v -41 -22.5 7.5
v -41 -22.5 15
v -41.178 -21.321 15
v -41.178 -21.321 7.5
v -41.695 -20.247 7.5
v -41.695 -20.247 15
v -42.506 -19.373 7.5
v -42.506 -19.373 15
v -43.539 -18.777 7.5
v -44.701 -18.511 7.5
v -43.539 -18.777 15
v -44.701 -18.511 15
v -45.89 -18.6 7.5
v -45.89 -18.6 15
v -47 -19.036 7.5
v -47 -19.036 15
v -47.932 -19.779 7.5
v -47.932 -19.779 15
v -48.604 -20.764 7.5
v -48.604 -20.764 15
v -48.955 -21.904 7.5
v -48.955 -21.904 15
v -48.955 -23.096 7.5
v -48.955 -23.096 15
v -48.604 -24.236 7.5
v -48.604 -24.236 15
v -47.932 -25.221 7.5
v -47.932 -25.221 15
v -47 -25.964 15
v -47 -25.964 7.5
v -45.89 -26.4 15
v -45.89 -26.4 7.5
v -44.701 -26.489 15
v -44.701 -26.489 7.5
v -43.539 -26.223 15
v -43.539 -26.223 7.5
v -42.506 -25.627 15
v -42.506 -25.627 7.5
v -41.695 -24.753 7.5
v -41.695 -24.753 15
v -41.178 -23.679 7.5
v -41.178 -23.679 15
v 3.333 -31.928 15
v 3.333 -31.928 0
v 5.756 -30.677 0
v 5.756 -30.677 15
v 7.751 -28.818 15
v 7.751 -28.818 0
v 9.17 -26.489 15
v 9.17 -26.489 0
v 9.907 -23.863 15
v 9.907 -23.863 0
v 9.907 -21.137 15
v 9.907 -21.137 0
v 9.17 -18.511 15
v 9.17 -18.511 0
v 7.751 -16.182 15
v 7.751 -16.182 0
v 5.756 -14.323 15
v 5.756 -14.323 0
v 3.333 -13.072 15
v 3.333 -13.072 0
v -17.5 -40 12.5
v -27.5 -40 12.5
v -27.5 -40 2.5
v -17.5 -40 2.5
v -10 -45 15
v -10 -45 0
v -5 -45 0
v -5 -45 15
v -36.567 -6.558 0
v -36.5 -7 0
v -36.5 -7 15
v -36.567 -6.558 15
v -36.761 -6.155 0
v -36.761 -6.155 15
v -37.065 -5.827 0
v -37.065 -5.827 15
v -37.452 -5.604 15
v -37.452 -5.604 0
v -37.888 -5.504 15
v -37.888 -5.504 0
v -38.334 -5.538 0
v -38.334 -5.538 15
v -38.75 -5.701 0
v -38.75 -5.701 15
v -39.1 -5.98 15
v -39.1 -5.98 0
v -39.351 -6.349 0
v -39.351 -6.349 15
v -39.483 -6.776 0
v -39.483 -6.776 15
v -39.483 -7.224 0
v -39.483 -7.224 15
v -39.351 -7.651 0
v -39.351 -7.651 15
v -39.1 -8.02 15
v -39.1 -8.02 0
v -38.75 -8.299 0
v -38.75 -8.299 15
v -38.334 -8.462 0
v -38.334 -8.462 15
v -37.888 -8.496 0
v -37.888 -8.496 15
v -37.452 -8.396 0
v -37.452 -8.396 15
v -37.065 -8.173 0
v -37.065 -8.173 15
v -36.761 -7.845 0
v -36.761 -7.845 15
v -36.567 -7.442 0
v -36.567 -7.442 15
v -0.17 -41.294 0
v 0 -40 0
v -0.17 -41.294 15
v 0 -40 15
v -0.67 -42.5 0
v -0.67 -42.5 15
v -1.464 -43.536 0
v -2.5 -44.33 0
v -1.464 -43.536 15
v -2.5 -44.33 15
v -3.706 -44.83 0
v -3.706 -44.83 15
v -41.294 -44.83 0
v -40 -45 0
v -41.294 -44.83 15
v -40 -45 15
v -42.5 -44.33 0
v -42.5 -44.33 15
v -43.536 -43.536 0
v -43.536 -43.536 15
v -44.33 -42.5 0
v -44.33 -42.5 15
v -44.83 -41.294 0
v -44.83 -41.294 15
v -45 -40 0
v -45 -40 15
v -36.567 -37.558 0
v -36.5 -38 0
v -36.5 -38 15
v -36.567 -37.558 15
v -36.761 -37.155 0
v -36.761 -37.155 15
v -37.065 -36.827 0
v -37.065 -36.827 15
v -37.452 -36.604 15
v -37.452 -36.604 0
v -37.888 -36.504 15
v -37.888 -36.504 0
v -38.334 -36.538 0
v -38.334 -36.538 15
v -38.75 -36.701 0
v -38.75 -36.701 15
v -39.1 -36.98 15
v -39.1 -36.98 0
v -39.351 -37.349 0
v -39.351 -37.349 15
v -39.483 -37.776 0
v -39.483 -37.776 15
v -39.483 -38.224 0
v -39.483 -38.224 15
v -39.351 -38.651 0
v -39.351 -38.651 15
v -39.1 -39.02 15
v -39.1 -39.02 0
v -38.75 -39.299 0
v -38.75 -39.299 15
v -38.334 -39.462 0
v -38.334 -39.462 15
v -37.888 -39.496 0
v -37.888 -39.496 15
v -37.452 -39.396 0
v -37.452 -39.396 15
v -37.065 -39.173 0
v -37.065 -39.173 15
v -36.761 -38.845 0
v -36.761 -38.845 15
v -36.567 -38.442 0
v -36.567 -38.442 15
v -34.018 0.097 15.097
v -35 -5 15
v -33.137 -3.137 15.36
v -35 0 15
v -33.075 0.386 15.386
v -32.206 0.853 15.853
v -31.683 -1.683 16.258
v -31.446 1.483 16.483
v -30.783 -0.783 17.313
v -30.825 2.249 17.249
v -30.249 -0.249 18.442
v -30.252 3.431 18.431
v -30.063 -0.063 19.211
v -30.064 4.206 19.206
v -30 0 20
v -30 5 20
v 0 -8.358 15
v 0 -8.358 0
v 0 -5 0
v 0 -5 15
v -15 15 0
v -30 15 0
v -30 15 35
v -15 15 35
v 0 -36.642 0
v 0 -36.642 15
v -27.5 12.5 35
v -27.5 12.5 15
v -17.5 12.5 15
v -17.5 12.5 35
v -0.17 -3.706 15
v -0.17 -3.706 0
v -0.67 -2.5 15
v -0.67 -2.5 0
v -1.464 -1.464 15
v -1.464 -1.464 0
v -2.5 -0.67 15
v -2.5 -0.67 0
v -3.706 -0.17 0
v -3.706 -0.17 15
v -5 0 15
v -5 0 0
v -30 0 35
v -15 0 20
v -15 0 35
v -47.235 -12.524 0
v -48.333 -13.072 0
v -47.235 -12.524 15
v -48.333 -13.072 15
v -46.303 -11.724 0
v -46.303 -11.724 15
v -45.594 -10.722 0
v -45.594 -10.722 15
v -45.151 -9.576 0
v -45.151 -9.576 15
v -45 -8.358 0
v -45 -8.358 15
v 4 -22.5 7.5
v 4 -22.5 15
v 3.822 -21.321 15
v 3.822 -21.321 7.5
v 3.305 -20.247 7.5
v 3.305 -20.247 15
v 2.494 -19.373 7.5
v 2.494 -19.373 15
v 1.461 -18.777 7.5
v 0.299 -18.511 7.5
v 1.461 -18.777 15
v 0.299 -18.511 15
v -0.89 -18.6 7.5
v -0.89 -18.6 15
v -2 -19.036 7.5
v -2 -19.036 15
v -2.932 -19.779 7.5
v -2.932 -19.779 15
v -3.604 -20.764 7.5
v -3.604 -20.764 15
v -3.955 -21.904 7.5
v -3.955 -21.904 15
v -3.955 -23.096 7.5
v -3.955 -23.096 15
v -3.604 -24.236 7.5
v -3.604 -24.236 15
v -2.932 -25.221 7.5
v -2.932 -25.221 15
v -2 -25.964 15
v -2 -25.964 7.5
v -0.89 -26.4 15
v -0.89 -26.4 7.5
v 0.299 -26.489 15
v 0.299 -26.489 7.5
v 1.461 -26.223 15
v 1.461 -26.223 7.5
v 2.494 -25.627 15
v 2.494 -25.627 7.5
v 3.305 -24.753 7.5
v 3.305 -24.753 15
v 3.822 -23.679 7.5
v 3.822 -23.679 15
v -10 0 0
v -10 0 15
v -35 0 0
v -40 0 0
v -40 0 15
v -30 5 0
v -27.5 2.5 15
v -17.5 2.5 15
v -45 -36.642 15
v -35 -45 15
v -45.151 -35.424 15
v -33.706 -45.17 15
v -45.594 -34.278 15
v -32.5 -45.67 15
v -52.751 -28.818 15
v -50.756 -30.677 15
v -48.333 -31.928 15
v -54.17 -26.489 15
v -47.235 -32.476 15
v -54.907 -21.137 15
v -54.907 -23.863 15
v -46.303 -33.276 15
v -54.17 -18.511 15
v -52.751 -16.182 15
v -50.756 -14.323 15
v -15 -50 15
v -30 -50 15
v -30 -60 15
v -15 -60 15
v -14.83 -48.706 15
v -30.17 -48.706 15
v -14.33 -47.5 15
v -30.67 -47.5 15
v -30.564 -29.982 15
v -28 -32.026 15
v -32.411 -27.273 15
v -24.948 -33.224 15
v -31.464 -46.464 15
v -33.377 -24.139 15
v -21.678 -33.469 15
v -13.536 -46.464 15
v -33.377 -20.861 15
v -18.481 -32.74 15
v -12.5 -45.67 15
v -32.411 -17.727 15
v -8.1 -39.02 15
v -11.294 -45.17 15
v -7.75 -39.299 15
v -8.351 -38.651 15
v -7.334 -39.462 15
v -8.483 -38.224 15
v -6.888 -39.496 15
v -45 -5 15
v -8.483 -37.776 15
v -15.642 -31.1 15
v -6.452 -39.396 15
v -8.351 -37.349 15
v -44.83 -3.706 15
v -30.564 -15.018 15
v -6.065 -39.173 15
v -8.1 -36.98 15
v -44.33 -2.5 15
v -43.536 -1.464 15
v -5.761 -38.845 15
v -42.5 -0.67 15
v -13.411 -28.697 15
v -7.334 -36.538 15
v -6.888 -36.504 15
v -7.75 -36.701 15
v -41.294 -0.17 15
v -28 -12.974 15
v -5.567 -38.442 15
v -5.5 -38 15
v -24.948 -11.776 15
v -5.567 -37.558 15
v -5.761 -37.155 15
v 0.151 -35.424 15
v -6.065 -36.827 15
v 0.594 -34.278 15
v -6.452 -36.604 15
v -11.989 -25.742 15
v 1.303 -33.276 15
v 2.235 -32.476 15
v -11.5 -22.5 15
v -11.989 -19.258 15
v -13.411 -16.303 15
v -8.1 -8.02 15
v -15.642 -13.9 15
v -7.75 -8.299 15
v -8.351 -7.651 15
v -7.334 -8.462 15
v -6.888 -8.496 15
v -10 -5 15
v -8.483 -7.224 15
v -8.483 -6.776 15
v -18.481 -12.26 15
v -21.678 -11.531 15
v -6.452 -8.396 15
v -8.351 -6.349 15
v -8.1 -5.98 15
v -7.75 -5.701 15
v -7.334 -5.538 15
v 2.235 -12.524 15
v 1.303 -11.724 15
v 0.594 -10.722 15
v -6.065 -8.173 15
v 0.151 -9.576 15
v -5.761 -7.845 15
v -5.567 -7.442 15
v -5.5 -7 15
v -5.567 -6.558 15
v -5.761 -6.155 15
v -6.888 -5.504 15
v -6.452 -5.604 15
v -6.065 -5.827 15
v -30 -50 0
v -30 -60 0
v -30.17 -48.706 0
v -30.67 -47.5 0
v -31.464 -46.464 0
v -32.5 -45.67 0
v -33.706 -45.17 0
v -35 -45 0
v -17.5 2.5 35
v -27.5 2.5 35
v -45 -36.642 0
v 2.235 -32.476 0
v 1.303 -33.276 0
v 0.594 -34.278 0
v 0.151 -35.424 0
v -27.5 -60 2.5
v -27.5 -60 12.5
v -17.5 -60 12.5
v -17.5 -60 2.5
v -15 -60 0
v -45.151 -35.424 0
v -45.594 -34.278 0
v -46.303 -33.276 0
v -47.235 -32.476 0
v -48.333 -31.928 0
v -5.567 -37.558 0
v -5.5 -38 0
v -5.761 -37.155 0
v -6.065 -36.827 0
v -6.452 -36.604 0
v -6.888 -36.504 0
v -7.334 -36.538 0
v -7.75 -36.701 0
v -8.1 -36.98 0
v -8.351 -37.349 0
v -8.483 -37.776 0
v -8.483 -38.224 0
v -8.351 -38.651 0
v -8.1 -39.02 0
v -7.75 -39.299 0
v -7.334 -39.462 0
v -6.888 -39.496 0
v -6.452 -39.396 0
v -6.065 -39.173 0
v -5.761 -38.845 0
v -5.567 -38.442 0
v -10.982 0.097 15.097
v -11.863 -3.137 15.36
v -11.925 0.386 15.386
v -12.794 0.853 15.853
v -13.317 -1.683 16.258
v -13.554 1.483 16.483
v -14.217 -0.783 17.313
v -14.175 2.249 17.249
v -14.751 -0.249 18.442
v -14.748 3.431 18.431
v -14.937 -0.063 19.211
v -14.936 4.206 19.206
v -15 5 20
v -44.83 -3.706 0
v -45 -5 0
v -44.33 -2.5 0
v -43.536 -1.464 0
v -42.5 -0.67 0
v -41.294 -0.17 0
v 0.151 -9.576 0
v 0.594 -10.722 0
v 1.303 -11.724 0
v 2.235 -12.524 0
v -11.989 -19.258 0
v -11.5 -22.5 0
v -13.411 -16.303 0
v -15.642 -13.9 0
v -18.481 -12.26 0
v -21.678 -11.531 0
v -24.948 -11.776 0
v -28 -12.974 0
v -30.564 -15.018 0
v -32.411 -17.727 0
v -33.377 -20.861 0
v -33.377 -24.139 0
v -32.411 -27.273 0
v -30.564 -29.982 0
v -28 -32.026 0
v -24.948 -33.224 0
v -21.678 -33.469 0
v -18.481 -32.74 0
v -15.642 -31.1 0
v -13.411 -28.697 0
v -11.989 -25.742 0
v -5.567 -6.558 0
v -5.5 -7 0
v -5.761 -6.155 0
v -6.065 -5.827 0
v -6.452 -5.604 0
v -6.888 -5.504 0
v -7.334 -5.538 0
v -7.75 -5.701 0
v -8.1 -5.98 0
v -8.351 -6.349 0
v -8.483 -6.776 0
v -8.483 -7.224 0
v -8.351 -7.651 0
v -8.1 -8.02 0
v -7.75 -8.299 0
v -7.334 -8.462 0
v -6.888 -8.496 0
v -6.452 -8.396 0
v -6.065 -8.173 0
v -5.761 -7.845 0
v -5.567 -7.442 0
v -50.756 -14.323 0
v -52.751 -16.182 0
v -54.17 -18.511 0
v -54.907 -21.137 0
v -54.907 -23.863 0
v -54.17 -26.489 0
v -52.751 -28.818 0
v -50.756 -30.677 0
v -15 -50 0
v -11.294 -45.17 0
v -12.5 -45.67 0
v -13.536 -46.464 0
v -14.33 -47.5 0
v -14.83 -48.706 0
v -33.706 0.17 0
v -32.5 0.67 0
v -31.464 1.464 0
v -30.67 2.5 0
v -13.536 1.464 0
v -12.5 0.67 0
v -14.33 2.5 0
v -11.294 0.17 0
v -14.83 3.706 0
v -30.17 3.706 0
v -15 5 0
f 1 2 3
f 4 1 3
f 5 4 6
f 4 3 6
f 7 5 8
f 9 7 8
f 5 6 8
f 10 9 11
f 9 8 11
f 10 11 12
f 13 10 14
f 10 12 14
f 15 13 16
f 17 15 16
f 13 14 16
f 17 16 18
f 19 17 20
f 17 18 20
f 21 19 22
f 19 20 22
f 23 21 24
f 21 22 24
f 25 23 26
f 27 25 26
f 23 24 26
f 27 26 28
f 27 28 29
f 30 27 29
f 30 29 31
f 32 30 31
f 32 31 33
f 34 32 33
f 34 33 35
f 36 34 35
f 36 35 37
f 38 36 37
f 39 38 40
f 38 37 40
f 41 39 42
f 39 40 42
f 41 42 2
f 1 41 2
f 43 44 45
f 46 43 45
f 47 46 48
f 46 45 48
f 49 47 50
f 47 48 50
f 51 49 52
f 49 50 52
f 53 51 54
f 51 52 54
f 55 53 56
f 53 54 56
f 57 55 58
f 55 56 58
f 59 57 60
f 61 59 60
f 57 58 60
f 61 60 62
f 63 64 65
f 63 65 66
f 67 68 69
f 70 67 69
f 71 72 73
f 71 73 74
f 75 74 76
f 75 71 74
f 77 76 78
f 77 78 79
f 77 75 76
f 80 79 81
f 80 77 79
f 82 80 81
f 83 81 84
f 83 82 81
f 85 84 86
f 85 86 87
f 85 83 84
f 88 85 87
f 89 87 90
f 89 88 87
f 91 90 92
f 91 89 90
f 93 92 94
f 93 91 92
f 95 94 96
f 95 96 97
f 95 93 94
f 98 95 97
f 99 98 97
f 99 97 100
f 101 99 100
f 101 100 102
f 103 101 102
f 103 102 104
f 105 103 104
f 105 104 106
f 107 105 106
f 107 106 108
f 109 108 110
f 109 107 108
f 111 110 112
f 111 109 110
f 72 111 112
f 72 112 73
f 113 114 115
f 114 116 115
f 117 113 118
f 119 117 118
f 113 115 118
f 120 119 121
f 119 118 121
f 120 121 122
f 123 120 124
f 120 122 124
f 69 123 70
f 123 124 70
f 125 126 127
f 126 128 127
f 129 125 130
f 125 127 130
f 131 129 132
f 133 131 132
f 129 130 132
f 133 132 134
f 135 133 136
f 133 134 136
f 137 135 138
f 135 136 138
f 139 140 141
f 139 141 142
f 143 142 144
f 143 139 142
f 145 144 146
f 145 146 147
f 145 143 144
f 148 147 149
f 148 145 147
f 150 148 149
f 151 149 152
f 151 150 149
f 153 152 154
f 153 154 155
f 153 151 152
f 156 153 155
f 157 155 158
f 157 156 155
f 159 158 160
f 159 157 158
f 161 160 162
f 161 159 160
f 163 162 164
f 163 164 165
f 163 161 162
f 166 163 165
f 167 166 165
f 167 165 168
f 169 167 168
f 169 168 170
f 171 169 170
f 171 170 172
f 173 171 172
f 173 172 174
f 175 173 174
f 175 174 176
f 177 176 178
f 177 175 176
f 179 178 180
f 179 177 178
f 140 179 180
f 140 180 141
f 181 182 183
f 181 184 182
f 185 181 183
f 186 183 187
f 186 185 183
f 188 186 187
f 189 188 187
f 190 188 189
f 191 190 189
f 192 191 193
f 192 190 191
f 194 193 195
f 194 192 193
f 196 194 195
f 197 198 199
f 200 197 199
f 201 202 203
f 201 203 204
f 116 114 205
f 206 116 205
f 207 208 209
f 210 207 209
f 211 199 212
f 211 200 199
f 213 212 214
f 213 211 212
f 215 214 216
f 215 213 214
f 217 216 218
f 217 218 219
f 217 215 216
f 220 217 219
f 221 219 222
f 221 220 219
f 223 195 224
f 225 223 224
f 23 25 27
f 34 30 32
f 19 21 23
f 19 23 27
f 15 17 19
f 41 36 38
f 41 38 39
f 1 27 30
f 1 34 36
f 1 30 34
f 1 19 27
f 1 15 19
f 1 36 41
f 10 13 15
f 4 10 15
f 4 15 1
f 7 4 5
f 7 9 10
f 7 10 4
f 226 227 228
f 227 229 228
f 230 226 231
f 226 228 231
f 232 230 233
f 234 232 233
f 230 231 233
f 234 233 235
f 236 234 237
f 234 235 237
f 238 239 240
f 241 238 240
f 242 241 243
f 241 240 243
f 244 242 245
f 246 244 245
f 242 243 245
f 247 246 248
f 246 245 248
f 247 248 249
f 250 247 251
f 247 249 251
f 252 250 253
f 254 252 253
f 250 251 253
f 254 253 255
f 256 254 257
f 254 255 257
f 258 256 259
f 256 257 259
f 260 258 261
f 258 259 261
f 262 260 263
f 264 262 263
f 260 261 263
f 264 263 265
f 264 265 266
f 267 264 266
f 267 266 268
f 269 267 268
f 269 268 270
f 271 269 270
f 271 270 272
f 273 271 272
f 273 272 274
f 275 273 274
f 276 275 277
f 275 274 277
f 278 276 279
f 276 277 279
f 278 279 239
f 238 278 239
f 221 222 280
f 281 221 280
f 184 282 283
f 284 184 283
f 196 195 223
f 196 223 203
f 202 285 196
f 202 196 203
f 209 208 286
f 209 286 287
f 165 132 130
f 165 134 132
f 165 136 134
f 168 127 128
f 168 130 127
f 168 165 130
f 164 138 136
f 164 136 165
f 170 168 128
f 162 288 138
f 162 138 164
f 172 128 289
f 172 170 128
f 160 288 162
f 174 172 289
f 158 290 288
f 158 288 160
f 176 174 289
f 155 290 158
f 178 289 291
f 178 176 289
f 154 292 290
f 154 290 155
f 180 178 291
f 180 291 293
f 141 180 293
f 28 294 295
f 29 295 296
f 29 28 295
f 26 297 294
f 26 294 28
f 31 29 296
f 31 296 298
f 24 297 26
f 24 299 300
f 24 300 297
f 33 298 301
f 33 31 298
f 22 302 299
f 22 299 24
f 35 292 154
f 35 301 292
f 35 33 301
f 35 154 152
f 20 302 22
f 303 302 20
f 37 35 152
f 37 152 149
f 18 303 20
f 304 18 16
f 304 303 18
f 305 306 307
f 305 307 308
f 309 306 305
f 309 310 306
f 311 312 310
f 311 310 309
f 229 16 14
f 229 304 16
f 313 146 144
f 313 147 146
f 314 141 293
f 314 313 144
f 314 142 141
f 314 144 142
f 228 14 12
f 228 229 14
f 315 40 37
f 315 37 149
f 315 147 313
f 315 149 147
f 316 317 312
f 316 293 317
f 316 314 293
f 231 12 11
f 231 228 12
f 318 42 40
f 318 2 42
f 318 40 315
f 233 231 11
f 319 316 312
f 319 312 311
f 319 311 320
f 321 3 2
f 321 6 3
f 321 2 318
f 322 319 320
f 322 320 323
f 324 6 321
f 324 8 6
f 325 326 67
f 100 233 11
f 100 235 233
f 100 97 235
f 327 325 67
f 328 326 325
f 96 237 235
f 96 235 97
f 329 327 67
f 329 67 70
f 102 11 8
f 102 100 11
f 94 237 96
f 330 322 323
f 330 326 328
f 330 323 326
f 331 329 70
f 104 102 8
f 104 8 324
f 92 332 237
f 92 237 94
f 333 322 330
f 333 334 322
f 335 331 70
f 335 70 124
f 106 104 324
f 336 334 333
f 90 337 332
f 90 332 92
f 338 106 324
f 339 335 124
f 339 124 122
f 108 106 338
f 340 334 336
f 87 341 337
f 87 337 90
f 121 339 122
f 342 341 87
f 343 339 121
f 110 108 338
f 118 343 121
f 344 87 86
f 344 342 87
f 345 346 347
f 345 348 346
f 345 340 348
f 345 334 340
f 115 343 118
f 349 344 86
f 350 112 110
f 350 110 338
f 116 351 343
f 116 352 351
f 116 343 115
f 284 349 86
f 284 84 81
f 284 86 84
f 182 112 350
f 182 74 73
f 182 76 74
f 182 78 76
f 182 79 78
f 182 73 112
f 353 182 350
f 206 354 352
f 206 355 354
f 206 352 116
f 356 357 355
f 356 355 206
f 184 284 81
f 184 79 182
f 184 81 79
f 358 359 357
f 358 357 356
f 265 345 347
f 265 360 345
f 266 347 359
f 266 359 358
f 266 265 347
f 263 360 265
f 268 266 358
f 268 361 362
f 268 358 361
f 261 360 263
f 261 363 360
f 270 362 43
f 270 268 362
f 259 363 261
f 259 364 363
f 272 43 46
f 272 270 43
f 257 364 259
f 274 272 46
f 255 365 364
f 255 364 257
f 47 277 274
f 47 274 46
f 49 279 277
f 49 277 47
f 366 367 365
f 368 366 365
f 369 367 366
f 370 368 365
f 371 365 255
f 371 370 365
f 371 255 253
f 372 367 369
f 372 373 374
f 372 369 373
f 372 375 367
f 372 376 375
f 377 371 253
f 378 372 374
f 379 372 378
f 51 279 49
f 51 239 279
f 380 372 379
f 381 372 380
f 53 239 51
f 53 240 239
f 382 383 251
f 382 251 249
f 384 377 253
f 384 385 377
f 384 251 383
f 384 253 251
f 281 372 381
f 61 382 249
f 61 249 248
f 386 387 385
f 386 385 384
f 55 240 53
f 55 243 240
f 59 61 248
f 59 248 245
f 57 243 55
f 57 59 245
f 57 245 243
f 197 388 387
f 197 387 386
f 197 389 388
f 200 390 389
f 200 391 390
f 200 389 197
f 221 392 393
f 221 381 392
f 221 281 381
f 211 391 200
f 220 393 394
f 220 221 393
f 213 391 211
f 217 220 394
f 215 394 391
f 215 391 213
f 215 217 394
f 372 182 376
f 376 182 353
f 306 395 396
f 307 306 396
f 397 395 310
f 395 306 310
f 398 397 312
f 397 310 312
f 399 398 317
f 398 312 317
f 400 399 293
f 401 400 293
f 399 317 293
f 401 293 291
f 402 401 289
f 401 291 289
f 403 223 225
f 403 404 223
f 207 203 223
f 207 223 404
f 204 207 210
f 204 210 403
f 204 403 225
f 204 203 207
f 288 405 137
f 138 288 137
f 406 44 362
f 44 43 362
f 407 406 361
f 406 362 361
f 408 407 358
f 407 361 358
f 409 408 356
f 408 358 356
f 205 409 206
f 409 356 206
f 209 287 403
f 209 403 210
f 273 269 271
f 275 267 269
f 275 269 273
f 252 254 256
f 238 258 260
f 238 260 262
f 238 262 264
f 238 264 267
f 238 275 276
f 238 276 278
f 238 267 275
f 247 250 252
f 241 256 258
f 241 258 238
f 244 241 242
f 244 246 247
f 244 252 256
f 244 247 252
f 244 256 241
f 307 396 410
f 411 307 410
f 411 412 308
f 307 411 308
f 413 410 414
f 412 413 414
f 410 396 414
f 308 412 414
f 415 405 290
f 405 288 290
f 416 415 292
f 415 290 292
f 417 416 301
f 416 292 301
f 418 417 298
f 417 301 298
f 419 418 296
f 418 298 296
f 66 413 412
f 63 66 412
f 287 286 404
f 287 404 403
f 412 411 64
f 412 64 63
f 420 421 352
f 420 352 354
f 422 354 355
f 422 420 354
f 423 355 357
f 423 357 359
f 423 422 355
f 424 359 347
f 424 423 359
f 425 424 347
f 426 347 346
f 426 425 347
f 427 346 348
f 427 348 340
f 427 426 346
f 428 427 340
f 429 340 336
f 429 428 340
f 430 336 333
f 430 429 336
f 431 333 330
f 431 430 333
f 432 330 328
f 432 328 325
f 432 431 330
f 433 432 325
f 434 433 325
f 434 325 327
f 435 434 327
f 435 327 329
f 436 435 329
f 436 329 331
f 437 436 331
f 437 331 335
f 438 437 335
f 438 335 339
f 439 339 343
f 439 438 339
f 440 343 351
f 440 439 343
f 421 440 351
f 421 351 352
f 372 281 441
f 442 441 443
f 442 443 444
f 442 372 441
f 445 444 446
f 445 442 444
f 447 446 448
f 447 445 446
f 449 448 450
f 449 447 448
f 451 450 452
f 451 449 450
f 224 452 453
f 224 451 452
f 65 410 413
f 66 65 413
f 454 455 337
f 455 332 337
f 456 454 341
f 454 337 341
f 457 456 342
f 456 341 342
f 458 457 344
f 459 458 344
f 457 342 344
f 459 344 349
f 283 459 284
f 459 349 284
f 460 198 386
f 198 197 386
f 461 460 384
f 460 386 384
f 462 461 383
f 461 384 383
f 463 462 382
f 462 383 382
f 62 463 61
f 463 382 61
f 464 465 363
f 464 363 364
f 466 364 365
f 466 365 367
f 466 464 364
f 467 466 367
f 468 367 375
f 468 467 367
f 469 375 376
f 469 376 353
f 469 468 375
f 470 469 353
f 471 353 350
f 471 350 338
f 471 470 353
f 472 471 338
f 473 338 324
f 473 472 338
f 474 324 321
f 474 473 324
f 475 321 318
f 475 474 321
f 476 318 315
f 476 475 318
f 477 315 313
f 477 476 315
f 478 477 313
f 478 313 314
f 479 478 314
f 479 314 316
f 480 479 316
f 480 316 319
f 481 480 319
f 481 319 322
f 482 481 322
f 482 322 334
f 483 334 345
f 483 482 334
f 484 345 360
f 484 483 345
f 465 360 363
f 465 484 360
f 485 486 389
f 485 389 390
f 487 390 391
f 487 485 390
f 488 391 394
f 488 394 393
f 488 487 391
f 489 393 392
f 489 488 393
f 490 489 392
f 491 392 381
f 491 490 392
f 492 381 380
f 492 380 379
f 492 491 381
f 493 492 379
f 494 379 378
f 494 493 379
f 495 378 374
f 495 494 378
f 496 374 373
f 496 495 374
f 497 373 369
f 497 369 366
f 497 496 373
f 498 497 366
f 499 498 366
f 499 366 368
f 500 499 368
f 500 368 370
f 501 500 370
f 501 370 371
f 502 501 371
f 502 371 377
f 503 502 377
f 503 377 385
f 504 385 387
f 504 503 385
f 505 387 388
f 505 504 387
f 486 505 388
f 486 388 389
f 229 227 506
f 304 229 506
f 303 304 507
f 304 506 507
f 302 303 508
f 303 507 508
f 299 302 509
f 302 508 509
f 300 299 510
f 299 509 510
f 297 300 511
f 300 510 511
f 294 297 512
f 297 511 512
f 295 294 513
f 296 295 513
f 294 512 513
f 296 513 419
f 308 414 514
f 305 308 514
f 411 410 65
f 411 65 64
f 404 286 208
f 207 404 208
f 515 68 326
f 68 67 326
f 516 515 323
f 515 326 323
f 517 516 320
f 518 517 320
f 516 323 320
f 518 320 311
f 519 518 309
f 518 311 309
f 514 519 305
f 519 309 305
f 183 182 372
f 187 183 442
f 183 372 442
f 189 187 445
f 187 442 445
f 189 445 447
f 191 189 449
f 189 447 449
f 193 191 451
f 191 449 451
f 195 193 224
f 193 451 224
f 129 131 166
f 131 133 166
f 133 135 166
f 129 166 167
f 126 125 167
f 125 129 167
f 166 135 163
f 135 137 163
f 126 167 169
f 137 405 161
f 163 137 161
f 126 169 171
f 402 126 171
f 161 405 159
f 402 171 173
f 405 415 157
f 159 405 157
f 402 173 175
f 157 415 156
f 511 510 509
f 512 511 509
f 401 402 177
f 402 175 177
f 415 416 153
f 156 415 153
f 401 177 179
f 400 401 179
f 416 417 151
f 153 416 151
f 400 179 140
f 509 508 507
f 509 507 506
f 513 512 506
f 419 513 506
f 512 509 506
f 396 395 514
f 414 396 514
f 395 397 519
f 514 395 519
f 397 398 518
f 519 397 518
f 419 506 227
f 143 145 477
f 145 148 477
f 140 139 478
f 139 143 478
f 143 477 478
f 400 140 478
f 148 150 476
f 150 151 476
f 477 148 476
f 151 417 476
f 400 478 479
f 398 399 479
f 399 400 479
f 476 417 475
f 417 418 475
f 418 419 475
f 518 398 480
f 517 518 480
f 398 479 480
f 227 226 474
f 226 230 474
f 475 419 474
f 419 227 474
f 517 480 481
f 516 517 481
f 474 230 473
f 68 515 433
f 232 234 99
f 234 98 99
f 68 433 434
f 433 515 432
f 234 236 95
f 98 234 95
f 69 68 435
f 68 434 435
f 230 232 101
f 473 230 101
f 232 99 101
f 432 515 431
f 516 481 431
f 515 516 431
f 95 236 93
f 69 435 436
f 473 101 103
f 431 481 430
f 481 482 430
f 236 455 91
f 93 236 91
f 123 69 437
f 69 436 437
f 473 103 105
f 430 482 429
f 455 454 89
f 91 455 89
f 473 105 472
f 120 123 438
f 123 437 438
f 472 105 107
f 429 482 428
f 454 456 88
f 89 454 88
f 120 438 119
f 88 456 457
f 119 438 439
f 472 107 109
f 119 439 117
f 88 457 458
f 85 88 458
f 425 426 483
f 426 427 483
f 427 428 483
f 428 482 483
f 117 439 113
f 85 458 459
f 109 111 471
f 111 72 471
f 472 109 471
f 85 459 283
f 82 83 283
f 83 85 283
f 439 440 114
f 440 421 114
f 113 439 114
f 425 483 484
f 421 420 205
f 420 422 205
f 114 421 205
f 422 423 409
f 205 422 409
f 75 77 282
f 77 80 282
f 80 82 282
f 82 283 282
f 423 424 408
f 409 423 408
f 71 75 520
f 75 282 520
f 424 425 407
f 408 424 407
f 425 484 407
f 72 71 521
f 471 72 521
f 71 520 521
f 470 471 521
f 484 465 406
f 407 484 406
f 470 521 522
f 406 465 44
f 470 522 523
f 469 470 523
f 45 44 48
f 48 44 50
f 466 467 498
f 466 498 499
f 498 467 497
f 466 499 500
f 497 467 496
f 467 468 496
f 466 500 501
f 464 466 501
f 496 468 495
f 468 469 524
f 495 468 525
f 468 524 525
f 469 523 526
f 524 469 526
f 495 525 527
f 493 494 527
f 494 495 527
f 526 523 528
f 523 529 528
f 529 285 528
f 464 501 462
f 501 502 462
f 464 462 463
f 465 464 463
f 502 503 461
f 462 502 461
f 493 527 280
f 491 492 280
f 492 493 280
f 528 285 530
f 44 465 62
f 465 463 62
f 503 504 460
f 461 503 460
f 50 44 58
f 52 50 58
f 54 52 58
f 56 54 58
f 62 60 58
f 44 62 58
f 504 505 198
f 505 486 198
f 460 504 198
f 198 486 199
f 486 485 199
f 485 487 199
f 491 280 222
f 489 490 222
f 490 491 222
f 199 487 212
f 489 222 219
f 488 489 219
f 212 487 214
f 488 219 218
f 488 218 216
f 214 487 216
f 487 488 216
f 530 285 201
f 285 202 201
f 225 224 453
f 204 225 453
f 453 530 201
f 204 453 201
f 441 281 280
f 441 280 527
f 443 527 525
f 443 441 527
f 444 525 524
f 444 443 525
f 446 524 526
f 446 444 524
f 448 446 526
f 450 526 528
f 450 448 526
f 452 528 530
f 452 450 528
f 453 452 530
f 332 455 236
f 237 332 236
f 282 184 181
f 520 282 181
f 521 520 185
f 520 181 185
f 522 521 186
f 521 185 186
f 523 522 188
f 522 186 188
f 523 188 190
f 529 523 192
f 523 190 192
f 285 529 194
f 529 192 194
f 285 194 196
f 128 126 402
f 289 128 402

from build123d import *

# Parameters (mm, degrees)
F0_R     = 1.5
F0_R_2   = 11
F1_DEPTH = 15
F2_W     = 10
F2_H     = 10
F3_DEPTH = 20
F4_W     = 15
F4_H     = 15
F4_W_2   = 10
F4_H_2   = 10
F5_DEPTH = 20
F6_F1_R  = 5
F6_F2_R  = 5
F6_F3_R  = 5
F6_F4_R  = 5
F6_F5_R  = 5
F6_F6_R  = 5
F6_F7_R  = 5
F6_F8_R  = 5
F6_F9_R  = 5
F6_F10_R = 5
F6_F11_R = 5
F6_F12_R = 5
F6_F13_R = 5
F7_R     = 4
F8_DEPTH = 7.5
F9_R     = 5


with BuildPart() as f1:
    # F0 (on Top) → F1 (new body)
    with BuildSketch(Plane.XY):
        with BuildLine():
            Line((-45, -32.5), (-45, -45))
            Line((-45, -45), (-30, -45))
            Line((-30, -45), (-30, -60))
            Line((-30, -60), (-15, -60))
            Line((-15, -60), (-15, -45))
            Line((-15, -45), (0, -45))
            Line((0, -45), (0, -32.5))
            ThreePointArc((0, -32.5), (10, -22.5), (0, -12.5))
            Line((0, -12.5), (0, 0))
            Line((0, 0), (-15, 0))
            Line((-15, 0), (-15, 15))
            Line((-15, 15), (-30, 15))
            Line((-30, 15), (-30, 0))
            Line((-30, 0), (-45, 0))
            Line((-45, 0), (-45, -12.5))
            ThreePointArc((-45, -12.5), (-55, -22.5), (-45, -32.5))
        make_face()
        with Locations((-38, -38)):
            Circle(F0_R, mode=Mode.SUBTRACT)
        with Locations((-7, -38)):
            Circle(F0_R, mode=Mode.SUBTRACT)
        with Locations((-38, -7)):
            Circle(F0_R, mode=Mode.SUBTRACT)
        with Locations((-22.5, -22.5)):
            Circle(F0_R_2, mode=Mode.SUBTRACT)
        with Locations((-7, -7)):
            Circle(F0_R, mode=Mode.SUBTRACT)
    extrude(amount=F1_DEPTH)

    # F2 (on face) → F3 (cut)
    with BuildSketch(Plane.XZ.offset(60)):
        with Locations((-22.5, 7.5)):
            Rectangle(F2_W, F2_H)
    extrude(amount=-F3_DEPTH, mode=Mode.SUBTRACT)

    # F4 (on face) → F5 (join)
    with BuildSketch(Plane.XY.offset(15)):
        with Locations((-22.5, 7.5)):
            Rectangle(F4_W, F4_H)
        with Locations((-22.5, 7.5)):
            Rectangle(F4_W_2, F4_H_2, mode=Mode.SUBTRACT)
    extrude(amount=F5_DEPTH)

    # F6: fillet of radius 5 on 13 edges, made by hand

    # F6_f1
    f6_f1_edges = [f1.edges().sort_by_distance(p)[0] for p in [
        (-15, 0, 7.5),
    ]]
    fillet(f6_f1_edges, radius=F6_F1_R)

    # F6_f2
    f6_f2_edges = [f1.edges().sort_by_distance(p)[0] for p in [
        (-22.5, 0, 15),
    ]]
    fillet(f6_f2_edges, radius=F6_F2_R)

    # F6_f3
    f6_f3_edges = [f1.edges().sort_by_distance(p)[0] for p in [
        (0, -12.5, 7.5),
    ]]
    fillet(f6_f3_edges, radius=F6_F3_R)

    # F6_f4
    f6_f4_edges = [f1.edges().sort_by_distance(p)[0] for p in [
        (0, 0, 7.5),
    ]]
    fillet(f6_f4_edges, radius=F6_F4_R)

    # F6_f5
    f6_f5_edges = [f1.edges().sort_by_distance(p)[0] for p in [
        (0, -32.5, 7.5),
    ]]
    fillet(f6_f5_edges, radius=F6_F5_R)

    # F6_f6
    f6_f6_edges = [f1.edges().sort_by_distance(p)[0] for p in [
        (0, -45, 7.5),
    ]]
    fillet(f6_f6_edges, radius=F6_F6_R)

    # F6_f7
    f6_f7_edges = [f1.edges().sort_by_distance(p)[0] for p in [
        (-15, -45, 7.5),
    ]]
    fillet(f6_f7_edges, radius=F6_F7_R)

    # F6_f8
    f6_f8_edges = [f1.edges().sort_by_distance(p)[0] for p in [
        (-30, -45, 7.5),
    ]]
    fillet(f6_f8_edges, radius=F6_F8_R)

    # F6_f9
    f6_f9_edges = [f1.edges().sort_by_distance(p)[0] for p in [
        (-45, -45, 7.5),
    ]]
    fillet(f6_f9_edges, radius=F6_F9_R)

    # F6_f10
    f6_f10_edges = [f1.edges().sort_by_distance(p)[0] for p in [
        (-45, -32.5, 7.5),
    ]]
    fillet(f6_f10_edges, radius=F6_F10_R)

    # F6_f11
    f6_f11_edges = [f1.edges().sort_by_distance(p)[0] for p in [
        (-45, -12.5, 7.5),
    ]]
    fillet(f6_f11_edges, radius=F6_F11_R)

    # F6_f12
    f6_f12_edges = [f1.edges().sort_by_distance(p)[0] for p in [
        (-45, 0, 7.5),
    ]]
    fillet(f6_f12_edges, radius=F6_F12_R)

    # F6_f13
    f6_f13_edges = [f1.edges().sort_by_distance(p)[0] for p in [
        (-30, 0, 7.5),
    ]]
    fillet(f6_f13_edges, radius=F6_F13_R)

    # F7 (on face) → F8 (cut)
    with BuildSketch(Plane.XY.offset(15)):
        with Locations((-45, -22.5)):
            Circle(F7_R)
        with Locations((0, -22.5)):
            Circle(F7_R)
    extrude(amount=-F8_DEPTH, mode=Mode.SUBTRACT)

    # F9
    f9_edges = [f1.edges().sort_by_distance(p)[0] for p in [
        (-15, 0, 15),
        (-30, 0, 15),
    ]]
    fillet(f9_edges, radius=F9_R)


solid = f1.part
